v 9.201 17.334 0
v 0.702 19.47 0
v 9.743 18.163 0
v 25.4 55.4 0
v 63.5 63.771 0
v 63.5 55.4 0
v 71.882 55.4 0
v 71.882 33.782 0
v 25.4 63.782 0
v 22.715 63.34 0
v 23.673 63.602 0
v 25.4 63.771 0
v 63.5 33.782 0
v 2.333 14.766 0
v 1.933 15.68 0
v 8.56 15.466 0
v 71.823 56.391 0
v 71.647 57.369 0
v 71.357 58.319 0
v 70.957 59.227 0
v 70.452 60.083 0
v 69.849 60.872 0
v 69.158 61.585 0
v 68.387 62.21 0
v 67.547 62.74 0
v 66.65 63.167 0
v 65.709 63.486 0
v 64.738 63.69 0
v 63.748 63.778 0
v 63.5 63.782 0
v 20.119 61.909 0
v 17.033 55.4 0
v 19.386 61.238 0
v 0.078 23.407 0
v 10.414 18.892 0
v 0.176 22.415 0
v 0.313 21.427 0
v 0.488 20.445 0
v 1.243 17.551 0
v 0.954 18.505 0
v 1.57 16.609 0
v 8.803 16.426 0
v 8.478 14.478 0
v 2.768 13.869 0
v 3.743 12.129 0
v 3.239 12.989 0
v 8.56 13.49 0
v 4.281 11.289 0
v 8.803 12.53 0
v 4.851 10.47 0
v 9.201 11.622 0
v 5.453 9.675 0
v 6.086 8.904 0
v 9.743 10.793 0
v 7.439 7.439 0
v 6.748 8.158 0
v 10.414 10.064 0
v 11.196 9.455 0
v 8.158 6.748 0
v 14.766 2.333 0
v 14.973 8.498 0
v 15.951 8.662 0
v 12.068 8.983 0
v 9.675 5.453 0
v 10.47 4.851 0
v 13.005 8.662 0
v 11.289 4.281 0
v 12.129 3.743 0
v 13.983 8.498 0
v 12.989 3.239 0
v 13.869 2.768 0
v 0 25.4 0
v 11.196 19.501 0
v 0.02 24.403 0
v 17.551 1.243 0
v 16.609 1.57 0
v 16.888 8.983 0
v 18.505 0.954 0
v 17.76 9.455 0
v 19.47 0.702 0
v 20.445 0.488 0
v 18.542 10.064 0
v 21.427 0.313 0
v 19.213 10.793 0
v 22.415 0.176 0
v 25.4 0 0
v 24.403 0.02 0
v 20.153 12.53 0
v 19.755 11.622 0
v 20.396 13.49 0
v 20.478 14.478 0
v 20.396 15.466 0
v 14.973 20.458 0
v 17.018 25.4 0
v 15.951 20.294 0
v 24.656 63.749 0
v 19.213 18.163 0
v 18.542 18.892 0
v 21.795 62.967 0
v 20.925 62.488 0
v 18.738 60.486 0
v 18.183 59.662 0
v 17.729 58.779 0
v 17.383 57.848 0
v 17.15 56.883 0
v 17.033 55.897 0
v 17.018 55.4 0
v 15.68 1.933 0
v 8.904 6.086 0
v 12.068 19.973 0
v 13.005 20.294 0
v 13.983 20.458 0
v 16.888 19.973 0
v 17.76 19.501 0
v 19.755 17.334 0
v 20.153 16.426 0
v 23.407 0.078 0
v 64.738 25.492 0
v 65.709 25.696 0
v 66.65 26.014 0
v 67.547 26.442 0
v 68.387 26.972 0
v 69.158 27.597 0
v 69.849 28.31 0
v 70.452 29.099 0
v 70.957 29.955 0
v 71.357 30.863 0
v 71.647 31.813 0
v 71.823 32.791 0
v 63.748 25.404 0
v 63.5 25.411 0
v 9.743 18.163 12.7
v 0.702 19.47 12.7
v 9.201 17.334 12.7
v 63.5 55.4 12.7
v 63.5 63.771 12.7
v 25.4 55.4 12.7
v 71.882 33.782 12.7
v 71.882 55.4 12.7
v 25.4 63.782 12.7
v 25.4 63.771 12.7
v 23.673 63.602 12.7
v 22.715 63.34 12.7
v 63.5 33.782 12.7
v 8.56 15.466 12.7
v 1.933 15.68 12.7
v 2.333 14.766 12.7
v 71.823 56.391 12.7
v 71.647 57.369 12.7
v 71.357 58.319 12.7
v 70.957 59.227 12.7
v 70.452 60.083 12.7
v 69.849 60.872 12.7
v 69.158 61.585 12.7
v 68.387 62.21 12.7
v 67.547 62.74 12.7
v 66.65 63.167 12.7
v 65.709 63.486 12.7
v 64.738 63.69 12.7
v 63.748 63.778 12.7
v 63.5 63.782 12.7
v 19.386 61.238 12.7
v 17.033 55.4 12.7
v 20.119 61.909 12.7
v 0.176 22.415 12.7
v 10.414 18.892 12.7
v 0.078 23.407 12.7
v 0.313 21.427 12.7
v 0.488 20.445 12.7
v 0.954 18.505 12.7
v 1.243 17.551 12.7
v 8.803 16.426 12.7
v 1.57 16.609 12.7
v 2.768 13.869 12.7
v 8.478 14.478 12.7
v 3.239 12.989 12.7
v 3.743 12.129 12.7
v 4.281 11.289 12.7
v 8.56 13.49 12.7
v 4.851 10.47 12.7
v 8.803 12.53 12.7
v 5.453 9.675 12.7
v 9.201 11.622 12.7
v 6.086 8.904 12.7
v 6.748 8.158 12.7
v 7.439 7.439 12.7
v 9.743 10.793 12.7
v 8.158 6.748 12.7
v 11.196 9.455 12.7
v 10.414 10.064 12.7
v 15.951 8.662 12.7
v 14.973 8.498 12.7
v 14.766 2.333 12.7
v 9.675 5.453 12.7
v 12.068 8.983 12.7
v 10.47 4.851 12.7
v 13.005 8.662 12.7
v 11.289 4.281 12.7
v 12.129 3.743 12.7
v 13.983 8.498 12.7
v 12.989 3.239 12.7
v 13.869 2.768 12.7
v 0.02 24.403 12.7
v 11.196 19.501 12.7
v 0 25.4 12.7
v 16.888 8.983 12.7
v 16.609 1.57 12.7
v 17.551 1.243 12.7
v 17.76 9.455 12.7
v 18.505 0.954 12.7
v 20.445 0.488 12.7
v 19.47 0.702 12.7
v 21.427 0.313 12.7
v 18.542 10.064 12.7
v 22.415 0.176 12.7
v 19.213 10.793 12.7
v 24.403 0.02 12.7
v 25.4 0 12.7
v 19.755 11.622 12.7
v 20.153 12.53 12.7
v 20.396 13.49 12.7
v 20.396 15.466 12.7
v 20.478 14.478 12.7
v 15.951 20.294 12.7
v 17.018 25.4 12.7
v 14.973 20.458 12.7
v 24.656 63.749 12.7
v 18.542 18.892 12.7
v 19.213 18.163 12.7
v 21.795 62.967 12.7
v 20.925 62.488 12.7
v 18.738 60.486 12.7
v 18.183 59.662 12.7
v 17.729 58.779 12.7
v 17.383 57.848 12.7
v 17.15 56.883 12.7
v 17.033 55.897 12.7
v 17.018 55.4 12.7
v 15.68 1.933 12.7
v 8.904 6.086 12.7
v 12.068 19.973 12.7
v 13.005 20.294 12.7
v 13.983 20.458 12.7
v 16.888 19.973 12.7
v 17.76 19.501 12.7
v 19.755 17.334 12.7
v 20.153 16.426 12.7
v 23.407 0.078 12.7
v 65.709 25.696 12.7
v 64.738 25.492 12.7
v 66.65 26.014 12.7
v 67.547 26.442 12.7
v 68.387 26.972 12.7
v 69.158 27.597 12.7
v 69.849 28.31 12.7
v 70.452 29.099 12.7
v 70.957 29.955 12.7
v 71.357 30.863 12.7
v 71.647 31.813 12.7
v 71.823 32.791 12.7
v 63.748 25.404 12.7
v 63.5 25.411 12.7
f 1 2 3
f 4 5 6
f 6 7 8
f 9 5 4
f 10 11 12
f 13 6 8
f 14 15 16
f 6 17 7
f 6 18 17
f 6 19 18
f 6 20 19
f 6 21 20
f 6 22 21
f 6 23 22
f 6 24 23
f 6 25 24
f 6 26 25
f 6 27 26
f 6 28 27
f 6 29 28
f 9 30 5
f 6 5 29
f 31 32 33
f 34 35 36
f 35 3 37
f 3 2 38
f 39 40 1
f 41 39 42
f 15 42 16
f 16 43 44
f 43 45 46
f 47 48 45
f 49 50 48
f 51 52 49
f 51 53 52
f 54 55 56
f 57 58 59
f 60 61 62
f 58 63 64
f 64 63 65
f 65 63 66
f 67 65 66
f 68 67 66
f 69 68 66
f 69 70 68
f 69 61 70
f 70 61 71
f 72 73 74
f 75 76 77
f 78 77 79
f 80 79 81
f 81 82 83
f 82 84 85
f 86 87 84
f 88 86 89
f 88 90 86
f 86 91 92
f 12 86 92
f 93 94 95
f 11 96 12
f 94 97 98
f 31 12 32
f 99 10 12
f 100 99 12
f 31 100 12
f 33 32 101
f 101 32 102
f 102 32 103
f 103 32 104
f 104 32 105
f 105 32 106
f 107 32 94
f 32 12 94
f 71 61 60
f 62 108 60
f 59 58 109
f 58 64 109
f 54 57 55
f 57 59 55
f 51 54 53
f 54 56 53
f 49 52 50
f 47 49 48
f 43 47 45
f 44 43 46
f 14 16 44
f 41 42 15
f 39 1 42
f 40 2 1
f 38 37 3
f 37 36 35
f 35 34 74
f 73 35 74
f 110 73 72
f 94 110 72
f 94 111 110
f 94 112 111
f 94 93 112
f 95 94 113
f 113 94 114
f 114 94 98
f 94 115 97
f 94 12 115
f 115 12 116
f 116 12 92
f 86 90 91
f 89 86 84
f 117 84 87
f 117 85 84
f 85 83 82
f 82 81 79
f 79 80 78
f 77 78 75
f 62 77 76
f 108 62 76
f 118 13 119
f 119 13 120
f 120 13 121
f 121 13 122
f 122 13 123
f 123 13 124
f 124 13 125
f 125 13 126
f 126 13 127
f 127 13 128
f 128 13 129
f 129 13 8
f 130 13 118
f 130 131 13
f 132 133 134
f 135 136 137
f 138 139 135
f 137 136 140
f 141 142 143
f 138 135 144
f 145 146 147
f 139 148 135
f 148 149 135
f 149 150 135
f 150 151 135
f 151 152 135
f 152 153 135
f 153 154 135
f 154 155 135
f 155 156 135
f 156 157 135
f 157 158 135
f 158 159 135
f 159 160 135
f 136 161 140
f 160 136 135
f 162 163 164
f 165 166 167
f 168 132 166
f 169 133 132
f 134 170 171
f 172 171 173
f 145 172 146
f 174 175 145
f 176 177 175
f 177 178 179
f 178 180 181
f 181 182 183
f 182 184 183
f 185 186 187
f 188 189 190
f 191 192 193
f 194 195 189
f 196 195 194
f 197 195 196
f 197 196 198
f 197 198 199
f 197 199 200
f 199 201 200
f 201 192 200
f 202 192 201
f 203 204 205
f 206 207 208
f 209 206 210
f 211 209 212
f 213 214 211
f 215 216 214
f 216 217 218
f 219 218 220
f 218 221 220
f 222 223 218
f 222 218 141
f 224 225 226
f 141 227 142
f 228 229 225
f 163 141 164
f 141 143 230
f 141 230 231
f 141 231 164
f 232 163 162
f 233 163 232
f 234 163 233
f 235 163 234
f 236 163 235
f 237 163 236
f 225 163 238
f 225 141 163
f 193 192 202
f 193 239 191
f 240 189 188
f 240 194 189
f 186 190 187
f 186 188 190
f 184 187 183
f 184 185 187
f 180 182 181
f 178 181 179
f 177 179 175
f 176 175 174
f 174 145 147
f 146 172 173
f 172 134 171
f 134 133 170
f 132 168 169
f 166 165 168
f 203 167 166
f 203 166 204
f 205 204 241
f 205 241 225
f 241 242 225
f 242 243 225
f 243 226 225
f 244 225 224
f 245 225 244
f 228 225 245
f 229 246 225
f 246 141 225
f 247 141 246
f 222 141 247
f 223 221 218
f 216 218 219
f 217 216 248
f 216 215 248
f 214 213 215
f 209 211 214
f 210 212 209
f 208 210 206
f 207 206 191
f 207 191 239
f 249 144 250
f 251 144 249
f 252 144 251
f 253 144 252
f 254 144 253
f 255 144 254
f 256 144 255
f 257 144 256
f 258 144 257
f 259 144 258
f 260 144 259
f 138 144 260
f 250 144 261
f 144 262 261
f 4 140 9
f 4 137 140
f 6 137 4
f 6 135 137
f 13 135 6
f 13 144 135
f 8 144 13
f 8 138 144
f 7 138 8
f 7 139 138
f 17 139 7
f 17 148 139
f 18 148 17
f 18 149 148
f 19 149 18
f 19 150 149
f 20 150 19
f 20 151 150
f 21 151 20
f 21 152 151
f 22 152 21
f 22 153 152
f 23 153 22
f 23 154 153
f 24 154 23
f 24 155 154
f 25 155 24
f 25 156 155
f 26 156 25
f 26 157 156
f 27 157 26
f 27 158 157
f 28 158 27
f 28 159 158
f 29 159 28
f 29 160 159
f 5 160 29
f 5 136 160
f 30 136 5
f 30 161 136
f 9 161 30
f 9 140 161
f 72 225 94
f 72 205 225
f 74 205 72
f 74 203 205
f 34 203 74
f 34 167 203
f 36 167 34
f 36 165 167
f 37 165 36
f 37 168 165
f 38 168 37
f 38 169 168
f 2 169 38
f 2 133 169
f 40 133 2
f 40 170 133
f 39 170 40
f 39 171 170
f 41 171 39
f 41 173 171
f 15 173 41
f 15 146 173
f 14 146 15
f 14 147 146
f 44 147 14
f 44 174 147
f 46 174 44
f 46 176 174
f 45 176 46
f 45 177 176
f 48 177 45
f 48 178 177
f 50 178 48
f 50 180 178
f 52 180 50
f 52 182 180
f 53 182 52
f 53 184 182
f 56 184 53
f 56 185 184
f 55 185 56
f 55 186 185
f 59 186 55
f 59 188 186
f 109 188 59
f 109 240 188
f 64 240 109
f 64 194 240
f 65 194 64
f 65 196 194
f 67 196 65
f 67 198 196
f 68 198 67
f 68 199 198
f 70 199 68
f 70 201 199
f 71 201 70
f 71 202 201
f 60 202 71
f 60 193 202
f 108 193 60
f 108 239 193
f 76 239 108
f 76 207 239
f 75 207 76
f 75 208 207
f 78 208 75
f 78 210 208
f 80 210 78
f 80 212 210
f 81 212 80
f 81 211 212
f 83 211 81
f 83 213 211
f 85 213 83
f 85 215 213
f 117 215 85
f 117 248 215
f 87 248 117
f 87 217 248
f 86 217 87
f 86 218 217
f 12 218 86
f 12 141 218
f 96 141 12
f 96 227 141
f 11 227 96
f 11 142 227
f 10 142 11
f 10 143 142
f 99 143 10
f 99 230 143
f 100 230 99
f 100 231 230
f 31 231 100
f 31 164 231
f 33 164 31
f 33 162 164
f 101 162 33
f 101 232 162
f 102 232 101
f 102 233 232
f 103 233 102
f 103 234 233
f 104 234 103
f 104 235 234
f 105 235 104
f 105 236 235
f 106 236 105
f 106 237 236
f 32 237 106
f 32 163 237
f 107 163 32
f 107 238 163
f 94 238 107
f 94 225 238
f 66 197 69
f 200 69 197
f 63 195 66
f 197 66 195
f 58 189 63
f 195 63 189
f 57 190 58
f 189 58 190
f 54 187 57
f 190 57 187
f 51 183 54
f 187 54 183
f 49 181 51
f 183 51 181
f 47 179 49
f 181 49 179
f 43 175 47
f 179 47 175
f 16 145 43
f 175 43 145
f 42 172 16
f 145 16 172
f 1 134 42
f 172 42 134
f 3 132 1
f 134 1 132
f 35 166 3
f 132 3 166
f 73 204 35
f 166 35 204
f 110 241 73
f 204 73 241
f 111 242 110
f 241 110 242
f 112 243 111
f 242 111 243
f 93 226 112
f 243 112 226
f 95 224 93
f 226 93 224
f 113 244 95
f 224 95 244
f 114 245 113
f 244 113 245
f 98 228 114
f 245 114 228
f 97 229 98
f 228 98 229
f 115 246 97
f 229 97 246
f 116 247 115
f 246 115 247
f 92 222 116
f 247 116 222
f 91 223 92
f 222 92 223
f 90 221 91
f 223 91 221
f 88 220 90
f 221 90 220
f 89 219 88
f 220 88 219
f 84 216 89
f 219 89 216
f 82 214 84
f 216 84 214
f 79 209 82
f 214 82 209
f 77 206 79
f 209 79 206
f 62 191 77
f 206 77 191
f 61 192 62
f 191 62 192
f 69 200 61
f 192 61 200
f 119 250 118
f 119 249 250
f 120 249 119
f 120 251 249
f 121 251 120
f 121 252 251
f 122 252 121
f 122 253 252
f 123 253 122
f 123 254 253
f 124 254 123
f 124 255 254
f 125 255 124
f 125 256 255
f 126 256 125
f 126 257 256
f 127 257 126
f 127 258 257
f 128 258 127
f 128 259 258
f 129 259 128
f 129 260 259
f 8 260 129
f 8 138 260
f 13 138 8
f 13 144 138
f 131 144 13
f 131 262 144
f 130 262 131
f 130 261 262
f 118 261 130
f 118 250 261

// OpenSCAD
// This is a bracket that goes against the top of an Ikea KALLAX shelf.
// By using two of them, you can support a large picture or poster board in a frame
// by leaning it against the wall.

in_to_mm = 2.54 * 10;

$fa = 1;
$fs = 1;

thickness = 0.33 * in_to_mm;
shelf_thickness = 1.5 * in_to_mm; // thickness of an ikea kallax shelf
length_lower = 3 * 10; // non negotiable with the kallax door insert
lip_radius = 1 * in_to_mm;
hole_pos = 0.57;

module round_corner(r, pos) {
	intersection() {
		square([r, r]);
		translate(
			pos == 1 ? [0, 0] :
			pos == 2 ? [0, r] : 
			pos == 3 ? [r, r] :
			pos == 4 ? [r, 0] :
			[0, 0]
		)
			circle(r);
	}
}

linear_extrude(0.5 * in_to_mm) {
	difference() {
		round_corner(lip_radius, 3);
		translate([lip_radius * hole_pos, lip_radius * hole_pos])
			circle(6);
	}
	translate([lip_radius-thickness, lip_radius])
		square([thickness, length_lower]);
	translate([lip_radius-thickness, lip_radius+length_lower])
		round_corner(thickness, 4);
	translate([lip_radius, lip_radius+length_lower])
		square([shelf_thickness, thickness]);
	translate([lip_radius+shelf_thickness, lip_radius+length_lower])
		round_corner(thickness, 1);
	translate([lip_radius + shelf_thickness, lip_radius + thickness])
		square([thickness, length_lower - thickness]);
	translate([lip_radius + shelf_thickness, lip_radius])
		round_corner(thickness, 2);
}
